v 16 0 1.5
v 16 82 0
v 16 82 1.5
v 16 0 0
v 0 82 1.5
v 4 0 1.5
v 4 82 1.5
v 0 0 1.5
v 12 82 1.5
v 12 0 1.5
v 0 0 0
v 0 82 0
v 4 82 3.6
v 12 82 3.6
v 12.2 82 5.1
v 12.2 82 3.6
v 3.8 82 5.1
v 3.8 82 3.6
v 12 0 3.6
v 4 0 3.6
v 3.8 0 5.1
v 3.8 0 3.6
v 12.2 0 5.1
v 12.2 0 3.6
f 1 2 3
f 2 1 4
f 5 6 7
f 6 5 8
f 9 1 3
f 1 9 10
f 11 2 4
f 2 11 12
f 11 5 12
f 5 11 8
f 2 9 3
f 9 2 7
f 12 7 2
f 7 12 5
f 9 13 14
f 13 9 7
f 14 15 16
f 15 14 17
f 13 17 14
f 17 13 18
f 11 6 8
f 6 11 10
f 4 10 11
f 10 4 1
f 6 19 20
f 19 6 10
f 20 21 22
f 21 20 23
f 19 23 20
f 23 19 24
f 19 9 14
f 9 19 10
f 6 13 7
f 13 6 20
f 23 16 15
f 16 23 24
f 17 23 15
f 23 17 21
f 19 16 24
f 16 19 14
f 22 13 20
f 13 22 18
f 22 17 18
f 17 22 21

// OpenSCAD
lun=82;
cube([16,lun,1.5]);

translate([4,0,1.5]) cube([8,lun,2.4]);
translate([3.8,0,3.6]) cube([8.4,lun,1.5]);
